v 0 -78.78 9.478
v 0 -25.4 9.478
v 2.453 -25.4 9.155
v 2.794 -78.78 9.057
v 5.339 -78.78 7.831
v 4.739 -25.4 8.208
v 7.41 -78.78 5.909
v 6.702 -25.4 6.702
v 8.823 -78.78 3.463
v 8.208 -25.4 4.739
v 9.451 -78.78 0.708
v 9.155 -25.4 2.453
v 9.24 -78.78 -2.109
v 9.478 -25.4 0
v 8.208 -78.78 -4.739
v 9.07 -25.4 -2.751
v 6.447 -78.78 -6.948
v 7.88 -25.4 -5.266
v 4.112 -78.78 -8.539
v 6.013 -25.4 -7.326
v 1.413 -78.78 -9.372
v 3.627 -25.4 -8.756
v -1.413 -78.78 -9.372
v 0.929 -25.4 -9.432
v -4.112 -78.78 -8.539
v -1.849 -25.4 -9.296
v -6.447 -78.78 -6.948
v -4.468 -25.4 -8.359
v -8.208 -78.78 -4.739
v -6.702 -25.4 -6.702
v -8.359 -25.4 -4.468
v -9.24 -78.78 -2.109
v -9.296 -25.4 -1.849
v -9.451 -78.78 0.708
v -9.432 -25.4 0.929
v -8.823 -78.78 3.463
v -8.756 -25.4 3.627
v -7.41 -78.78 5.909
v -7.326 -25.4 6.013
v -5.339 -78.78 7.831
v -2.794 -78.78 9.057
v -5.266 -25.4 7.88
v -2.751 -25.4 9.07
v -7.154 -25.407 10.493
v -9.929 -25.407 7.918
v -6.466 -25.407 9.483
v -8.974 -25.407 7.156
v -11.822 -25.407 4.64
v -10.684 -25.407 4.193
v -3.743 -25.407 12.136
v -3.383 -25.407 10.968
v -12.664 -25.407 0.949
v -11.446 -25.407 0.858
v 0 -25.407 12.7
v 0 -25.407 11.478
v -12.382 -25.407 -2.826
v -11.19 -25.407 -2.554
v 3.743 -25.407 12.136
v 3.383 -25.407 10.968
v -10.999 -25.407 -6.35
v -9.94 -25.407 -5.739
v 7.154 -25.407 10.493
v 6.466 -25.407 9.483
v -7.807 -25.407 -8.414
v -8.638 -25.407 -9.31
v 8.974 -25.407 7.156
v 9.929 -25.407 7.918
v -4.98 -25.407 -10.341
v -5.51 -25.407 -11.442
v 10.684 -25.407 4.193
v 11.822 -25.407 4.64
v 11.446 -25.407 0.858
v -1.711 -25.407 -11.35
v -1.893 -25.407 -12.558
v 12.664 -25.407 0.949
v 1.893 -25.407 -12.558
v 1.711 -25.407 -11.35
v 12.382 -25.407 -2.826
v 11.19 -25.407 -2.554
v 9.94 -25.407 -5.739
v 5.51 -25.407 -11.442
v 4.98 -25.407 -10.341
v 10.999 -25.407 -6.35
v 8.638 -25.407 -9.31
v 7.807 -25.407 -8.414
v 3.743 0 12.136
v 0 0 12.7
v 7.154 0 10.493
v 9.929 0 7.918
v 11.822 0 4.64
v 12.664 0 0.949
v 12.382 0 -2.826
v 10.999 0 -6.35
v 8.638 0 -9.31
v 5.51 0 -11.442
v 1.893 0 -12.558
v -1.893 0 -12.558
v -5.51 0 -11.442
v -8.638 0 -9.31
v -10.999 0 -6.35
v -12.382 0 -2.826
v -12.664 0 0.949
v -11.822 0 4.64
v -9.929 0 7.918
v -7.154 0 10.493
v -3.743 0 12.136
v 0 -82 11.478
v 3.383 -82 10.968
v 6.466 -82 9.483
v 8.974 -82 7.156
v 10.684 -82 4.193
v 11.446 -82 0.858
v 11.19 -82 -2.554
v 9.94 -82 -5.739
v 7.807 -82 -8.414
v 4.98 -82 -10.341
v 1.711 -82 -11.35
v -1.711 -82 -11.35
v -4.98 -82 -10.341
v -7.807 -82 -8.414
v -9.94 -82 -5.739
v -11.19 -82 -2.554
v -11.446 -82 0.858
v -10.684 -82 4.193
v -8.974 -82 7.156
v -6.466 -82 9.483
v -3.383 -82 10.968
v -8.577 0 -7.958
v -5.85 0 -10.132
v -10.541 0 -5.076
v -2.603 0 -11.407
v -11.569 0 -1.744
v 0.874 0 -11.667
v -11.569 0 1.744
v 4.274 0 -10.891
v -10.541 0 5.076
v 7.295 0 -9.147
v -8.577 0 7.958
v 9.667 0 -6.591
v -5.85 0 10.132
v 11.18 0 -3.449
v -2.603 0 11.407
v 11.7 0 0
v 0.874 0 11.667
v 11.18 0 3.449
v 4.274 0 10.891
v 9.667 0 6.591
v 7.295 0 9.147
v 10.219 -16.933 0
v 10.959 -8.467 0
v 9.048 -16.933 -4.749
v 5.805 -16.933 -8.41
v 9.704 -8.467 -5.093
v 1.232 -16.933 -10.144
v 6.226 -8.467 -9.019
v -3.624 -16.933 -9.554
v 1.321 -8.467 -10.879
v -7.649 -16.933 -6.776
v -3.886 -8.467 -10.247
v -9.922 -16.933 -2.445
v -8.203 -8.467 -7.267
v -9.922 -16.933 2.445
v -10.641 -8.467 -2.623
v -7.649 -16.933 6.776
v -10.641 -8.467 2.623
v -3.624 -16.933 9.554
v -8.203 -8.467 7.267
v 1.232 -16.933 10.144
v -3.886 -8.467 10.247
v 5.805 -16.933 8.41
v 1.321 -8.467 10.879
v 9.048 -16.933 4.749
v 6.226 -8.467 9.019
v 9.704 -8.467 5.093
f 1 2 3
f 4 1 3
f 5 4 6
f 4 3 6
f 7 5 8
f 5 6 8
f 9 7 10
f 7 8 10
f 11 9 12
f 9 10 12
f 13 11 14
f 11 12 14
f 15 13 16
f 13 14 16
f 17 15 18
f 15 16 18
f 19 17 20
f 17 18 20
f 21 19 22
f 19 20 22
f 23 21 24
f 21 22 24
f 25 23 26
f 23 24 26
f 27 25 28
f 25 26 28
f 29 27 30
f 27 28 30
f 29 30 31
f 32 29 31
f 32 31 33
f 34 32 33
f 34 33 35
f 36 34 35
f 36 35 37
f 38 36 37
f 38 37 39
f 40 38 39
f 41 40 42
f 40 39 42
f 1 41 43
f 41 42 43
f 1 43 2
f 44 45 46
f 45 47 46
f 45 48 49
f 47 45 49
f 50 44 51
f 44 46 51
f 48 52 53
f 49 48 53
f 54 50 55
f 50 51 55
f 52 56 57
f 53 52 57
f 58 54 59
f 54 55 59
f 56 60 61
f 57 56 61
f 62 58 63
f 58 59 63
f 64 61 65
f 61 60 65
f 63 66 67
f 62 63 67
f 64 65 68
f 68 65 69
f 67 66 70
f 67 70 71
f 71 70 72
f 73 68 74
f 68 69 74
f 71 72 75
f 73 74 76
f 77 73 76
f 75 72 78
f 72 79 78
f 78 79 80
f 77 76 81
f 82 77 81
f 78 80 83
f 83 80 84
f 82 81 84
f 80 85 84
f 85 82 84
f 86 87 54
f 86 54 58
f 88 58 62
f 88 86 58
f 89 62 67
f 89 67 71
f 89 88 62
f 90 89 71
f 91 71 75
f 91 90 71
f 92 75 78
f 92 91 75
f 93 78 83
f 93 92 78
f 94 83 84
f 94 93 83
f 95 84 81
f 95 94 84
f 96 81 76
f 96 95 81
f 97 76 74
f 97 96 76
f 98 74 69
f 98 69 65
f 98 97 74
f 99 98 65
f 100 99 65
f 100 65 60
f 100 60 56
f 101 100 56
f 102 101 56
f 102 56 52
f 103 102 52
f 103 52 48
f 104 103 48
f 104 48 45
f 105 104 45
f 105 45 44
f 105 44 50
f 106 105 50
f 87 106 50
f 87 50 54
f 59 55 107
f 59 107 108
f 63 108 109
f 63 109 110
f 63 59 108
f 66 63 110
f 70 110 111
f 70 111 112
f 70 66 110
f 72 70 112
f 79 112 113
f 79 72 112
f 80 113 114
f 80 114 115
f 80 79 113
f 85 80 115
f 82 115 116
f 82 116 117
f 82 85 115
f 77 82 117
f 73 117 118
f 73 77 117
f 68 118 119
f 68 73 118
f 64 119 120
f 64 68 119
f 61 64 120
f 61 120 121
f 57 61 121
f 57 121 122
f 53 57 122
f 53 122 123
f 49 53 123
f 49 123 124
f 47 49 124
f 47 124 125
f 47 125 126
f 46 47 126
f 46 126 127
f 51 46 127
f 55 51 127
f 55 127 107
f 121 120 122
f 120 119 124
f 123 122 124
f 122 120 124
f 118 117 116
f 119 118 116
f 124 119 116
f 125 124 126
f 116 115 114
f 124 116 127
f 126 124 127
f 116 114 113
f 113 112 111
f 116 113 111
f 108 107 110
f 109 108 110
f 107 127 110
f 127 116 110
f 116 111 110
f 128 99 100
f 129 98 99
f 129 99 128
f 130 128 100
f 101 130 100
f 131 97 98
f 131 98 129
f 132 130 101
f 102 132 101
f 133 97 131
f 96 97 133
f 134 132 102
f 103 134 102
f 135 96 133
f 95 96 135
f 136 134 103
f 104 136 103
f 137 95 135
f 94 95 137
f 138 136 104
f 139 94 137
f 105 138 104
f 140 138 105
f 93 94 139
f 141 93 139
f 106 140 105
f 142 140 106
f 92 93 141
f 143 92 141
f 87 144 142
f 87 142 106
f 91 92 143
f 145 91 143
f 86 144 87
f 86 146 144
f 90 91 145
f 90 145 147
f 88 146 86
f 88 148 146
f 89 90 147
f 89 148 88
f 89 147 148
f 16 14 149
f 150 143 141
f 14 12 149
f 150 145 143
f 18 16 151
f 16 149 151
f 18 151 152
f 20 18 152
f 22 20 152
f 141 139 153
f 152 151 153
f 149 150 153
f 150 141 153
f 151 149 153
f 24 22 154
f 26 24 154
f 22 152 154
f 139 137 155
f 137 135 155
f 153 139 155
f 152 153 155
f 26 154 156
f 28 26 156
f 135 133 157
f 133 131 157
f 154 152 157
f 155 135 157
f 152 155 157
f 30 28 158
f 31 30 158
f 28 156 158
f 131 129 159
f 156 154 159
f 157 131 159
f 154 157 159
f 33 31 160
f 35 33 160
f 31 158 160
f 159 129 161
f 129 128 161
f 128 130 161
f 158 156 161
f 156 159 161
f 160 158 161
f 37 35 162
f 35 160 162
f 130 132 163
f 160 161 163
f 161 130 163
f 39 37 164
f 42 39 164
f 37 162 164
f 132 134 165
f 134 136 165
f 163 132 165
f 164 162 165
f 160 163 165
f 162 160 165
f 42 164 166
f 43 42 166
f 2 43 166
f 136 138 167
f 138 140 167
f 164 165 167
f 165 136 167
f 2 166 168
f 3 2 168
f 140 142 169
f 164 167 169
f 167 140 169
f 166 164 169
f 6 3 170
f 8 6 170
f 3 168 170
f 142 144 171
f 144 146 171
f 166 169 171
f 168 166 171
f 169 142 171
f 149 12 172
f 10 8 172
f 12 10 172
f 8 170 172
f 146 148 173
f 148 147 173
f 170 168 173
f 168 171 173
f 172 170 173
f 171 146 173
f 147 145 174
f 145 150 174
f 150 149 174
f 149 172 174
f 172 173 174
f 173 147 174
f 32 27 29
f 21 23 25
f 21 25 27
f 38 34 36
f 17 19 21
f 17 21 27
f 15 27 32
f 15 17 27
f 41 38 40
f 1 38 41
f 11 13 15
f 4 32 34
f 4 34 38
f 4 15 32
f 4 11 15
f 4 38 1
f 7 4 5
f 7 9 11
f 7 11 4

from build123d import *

# Parameters (mm, degrees)
SKETCH1_R           = 12.7
BOSS_EXTRUDE1_DEPTH = 82
SKETCH2_R           = 11.7
CUT_EXTRUDE1_DEPTH  = 25.4
CUT_EXTRUDE1_DRAFT  = -5
SKETCH3_R           = 9.477787946
CUT_EXTRUDE2_DEPTH  = 53.38
SKETCH5_OUTSIDE_W   = 45.304
SKETCH5_OUTSIDE_H   = 45.304
SKETCH5_OUTSIDE_R   = 11.477787946
CUT_EXTRUDE4_DEPTH  = 60.374839676


with BuildPart() as part:
    # Sketch1 → Boss-Extrude1 (new body)
    with BuildSketch(Plane(origin=(0, 0, 0), x_dir=(1, 0, 0), z_dir=(0, 1, 0))):
        with Locations(Location((0, 0, 0), (0, 0, 270))):
            Circle(SKETCH1_R)
    extrude(amount=-BOSS_EXTRUDE1_DEPTH)


with BuildPart() as cut_extrude1_tool:
    # Sketch2 → Cut-Extrude1 (with draft: the straight prism first)
    with BuildSketch(Plane(origin=(0, 0, 0), x_dir=(1, 0, 0), z_dir=(0, 1, 0))):
        Circle(SKETCH2_R)
    extrude(amount=-CUT_EXTRUDE1_DEPTH)
    # Cut-Extrude1: the draft: its side faces are tilted about the plane it starts from
    cut_extrude1_sides = [cut_extrude1_tool.faces().sort_by_distance(p)[0] for p in [
        (-11.7, -12.7, 0),
    ]]
    draft(cut_extrude1_sides, Plane(origin=(0, 0, 0), x_dir=(1, 0, 0), z_dir=(0, 1, 0)), CUT_EXTRUDE1_DRAFT)


with BuildPart() as part_1:
    add(part.part)

    # Cut-Extrude1: cut by cut_extrude1_tool
    add(cut_extrude1_tool.part, mode=Mode.SUBTRACT)

    # Sketch3 → Cut-Extrude2 (cut)
    with BuildSketch(Plane(origin=(0, -25.4, 0), x_dir=(1, 0, 0), z_dir=(0, 1, 0))):
        with Locations(Location((0, 0, 0), (0, 0, 270))):
            Circle(SKETCH3_R)
    extrude(amount=-CUT_EXTRUDE2_DEPTH, mode=Mode.SUBTRACT)

    # Sketch5 outside → Cut-Extrude4 (cut, through all)
    with BuildSketch(Plane(origin=(0, -25.406788512, 0), x_dir=(1, 0, 0), z_dir=(0, 1, 0))):
        Rectangle(SKETCH5_OUTSIDE_W, SKETCH5_OUTSIDE_H)
        with Locations(Location((0, 0, 0), (0, 0, 270))):
            Circle(SKETCH5_OUTSIDE_R, mode=Mode.SUBTRACT)
    extrude(amount=-CUT_EXTRUDE4_DEPTH, mode=Mode.SUBTRACT)


solid = part_1.part
